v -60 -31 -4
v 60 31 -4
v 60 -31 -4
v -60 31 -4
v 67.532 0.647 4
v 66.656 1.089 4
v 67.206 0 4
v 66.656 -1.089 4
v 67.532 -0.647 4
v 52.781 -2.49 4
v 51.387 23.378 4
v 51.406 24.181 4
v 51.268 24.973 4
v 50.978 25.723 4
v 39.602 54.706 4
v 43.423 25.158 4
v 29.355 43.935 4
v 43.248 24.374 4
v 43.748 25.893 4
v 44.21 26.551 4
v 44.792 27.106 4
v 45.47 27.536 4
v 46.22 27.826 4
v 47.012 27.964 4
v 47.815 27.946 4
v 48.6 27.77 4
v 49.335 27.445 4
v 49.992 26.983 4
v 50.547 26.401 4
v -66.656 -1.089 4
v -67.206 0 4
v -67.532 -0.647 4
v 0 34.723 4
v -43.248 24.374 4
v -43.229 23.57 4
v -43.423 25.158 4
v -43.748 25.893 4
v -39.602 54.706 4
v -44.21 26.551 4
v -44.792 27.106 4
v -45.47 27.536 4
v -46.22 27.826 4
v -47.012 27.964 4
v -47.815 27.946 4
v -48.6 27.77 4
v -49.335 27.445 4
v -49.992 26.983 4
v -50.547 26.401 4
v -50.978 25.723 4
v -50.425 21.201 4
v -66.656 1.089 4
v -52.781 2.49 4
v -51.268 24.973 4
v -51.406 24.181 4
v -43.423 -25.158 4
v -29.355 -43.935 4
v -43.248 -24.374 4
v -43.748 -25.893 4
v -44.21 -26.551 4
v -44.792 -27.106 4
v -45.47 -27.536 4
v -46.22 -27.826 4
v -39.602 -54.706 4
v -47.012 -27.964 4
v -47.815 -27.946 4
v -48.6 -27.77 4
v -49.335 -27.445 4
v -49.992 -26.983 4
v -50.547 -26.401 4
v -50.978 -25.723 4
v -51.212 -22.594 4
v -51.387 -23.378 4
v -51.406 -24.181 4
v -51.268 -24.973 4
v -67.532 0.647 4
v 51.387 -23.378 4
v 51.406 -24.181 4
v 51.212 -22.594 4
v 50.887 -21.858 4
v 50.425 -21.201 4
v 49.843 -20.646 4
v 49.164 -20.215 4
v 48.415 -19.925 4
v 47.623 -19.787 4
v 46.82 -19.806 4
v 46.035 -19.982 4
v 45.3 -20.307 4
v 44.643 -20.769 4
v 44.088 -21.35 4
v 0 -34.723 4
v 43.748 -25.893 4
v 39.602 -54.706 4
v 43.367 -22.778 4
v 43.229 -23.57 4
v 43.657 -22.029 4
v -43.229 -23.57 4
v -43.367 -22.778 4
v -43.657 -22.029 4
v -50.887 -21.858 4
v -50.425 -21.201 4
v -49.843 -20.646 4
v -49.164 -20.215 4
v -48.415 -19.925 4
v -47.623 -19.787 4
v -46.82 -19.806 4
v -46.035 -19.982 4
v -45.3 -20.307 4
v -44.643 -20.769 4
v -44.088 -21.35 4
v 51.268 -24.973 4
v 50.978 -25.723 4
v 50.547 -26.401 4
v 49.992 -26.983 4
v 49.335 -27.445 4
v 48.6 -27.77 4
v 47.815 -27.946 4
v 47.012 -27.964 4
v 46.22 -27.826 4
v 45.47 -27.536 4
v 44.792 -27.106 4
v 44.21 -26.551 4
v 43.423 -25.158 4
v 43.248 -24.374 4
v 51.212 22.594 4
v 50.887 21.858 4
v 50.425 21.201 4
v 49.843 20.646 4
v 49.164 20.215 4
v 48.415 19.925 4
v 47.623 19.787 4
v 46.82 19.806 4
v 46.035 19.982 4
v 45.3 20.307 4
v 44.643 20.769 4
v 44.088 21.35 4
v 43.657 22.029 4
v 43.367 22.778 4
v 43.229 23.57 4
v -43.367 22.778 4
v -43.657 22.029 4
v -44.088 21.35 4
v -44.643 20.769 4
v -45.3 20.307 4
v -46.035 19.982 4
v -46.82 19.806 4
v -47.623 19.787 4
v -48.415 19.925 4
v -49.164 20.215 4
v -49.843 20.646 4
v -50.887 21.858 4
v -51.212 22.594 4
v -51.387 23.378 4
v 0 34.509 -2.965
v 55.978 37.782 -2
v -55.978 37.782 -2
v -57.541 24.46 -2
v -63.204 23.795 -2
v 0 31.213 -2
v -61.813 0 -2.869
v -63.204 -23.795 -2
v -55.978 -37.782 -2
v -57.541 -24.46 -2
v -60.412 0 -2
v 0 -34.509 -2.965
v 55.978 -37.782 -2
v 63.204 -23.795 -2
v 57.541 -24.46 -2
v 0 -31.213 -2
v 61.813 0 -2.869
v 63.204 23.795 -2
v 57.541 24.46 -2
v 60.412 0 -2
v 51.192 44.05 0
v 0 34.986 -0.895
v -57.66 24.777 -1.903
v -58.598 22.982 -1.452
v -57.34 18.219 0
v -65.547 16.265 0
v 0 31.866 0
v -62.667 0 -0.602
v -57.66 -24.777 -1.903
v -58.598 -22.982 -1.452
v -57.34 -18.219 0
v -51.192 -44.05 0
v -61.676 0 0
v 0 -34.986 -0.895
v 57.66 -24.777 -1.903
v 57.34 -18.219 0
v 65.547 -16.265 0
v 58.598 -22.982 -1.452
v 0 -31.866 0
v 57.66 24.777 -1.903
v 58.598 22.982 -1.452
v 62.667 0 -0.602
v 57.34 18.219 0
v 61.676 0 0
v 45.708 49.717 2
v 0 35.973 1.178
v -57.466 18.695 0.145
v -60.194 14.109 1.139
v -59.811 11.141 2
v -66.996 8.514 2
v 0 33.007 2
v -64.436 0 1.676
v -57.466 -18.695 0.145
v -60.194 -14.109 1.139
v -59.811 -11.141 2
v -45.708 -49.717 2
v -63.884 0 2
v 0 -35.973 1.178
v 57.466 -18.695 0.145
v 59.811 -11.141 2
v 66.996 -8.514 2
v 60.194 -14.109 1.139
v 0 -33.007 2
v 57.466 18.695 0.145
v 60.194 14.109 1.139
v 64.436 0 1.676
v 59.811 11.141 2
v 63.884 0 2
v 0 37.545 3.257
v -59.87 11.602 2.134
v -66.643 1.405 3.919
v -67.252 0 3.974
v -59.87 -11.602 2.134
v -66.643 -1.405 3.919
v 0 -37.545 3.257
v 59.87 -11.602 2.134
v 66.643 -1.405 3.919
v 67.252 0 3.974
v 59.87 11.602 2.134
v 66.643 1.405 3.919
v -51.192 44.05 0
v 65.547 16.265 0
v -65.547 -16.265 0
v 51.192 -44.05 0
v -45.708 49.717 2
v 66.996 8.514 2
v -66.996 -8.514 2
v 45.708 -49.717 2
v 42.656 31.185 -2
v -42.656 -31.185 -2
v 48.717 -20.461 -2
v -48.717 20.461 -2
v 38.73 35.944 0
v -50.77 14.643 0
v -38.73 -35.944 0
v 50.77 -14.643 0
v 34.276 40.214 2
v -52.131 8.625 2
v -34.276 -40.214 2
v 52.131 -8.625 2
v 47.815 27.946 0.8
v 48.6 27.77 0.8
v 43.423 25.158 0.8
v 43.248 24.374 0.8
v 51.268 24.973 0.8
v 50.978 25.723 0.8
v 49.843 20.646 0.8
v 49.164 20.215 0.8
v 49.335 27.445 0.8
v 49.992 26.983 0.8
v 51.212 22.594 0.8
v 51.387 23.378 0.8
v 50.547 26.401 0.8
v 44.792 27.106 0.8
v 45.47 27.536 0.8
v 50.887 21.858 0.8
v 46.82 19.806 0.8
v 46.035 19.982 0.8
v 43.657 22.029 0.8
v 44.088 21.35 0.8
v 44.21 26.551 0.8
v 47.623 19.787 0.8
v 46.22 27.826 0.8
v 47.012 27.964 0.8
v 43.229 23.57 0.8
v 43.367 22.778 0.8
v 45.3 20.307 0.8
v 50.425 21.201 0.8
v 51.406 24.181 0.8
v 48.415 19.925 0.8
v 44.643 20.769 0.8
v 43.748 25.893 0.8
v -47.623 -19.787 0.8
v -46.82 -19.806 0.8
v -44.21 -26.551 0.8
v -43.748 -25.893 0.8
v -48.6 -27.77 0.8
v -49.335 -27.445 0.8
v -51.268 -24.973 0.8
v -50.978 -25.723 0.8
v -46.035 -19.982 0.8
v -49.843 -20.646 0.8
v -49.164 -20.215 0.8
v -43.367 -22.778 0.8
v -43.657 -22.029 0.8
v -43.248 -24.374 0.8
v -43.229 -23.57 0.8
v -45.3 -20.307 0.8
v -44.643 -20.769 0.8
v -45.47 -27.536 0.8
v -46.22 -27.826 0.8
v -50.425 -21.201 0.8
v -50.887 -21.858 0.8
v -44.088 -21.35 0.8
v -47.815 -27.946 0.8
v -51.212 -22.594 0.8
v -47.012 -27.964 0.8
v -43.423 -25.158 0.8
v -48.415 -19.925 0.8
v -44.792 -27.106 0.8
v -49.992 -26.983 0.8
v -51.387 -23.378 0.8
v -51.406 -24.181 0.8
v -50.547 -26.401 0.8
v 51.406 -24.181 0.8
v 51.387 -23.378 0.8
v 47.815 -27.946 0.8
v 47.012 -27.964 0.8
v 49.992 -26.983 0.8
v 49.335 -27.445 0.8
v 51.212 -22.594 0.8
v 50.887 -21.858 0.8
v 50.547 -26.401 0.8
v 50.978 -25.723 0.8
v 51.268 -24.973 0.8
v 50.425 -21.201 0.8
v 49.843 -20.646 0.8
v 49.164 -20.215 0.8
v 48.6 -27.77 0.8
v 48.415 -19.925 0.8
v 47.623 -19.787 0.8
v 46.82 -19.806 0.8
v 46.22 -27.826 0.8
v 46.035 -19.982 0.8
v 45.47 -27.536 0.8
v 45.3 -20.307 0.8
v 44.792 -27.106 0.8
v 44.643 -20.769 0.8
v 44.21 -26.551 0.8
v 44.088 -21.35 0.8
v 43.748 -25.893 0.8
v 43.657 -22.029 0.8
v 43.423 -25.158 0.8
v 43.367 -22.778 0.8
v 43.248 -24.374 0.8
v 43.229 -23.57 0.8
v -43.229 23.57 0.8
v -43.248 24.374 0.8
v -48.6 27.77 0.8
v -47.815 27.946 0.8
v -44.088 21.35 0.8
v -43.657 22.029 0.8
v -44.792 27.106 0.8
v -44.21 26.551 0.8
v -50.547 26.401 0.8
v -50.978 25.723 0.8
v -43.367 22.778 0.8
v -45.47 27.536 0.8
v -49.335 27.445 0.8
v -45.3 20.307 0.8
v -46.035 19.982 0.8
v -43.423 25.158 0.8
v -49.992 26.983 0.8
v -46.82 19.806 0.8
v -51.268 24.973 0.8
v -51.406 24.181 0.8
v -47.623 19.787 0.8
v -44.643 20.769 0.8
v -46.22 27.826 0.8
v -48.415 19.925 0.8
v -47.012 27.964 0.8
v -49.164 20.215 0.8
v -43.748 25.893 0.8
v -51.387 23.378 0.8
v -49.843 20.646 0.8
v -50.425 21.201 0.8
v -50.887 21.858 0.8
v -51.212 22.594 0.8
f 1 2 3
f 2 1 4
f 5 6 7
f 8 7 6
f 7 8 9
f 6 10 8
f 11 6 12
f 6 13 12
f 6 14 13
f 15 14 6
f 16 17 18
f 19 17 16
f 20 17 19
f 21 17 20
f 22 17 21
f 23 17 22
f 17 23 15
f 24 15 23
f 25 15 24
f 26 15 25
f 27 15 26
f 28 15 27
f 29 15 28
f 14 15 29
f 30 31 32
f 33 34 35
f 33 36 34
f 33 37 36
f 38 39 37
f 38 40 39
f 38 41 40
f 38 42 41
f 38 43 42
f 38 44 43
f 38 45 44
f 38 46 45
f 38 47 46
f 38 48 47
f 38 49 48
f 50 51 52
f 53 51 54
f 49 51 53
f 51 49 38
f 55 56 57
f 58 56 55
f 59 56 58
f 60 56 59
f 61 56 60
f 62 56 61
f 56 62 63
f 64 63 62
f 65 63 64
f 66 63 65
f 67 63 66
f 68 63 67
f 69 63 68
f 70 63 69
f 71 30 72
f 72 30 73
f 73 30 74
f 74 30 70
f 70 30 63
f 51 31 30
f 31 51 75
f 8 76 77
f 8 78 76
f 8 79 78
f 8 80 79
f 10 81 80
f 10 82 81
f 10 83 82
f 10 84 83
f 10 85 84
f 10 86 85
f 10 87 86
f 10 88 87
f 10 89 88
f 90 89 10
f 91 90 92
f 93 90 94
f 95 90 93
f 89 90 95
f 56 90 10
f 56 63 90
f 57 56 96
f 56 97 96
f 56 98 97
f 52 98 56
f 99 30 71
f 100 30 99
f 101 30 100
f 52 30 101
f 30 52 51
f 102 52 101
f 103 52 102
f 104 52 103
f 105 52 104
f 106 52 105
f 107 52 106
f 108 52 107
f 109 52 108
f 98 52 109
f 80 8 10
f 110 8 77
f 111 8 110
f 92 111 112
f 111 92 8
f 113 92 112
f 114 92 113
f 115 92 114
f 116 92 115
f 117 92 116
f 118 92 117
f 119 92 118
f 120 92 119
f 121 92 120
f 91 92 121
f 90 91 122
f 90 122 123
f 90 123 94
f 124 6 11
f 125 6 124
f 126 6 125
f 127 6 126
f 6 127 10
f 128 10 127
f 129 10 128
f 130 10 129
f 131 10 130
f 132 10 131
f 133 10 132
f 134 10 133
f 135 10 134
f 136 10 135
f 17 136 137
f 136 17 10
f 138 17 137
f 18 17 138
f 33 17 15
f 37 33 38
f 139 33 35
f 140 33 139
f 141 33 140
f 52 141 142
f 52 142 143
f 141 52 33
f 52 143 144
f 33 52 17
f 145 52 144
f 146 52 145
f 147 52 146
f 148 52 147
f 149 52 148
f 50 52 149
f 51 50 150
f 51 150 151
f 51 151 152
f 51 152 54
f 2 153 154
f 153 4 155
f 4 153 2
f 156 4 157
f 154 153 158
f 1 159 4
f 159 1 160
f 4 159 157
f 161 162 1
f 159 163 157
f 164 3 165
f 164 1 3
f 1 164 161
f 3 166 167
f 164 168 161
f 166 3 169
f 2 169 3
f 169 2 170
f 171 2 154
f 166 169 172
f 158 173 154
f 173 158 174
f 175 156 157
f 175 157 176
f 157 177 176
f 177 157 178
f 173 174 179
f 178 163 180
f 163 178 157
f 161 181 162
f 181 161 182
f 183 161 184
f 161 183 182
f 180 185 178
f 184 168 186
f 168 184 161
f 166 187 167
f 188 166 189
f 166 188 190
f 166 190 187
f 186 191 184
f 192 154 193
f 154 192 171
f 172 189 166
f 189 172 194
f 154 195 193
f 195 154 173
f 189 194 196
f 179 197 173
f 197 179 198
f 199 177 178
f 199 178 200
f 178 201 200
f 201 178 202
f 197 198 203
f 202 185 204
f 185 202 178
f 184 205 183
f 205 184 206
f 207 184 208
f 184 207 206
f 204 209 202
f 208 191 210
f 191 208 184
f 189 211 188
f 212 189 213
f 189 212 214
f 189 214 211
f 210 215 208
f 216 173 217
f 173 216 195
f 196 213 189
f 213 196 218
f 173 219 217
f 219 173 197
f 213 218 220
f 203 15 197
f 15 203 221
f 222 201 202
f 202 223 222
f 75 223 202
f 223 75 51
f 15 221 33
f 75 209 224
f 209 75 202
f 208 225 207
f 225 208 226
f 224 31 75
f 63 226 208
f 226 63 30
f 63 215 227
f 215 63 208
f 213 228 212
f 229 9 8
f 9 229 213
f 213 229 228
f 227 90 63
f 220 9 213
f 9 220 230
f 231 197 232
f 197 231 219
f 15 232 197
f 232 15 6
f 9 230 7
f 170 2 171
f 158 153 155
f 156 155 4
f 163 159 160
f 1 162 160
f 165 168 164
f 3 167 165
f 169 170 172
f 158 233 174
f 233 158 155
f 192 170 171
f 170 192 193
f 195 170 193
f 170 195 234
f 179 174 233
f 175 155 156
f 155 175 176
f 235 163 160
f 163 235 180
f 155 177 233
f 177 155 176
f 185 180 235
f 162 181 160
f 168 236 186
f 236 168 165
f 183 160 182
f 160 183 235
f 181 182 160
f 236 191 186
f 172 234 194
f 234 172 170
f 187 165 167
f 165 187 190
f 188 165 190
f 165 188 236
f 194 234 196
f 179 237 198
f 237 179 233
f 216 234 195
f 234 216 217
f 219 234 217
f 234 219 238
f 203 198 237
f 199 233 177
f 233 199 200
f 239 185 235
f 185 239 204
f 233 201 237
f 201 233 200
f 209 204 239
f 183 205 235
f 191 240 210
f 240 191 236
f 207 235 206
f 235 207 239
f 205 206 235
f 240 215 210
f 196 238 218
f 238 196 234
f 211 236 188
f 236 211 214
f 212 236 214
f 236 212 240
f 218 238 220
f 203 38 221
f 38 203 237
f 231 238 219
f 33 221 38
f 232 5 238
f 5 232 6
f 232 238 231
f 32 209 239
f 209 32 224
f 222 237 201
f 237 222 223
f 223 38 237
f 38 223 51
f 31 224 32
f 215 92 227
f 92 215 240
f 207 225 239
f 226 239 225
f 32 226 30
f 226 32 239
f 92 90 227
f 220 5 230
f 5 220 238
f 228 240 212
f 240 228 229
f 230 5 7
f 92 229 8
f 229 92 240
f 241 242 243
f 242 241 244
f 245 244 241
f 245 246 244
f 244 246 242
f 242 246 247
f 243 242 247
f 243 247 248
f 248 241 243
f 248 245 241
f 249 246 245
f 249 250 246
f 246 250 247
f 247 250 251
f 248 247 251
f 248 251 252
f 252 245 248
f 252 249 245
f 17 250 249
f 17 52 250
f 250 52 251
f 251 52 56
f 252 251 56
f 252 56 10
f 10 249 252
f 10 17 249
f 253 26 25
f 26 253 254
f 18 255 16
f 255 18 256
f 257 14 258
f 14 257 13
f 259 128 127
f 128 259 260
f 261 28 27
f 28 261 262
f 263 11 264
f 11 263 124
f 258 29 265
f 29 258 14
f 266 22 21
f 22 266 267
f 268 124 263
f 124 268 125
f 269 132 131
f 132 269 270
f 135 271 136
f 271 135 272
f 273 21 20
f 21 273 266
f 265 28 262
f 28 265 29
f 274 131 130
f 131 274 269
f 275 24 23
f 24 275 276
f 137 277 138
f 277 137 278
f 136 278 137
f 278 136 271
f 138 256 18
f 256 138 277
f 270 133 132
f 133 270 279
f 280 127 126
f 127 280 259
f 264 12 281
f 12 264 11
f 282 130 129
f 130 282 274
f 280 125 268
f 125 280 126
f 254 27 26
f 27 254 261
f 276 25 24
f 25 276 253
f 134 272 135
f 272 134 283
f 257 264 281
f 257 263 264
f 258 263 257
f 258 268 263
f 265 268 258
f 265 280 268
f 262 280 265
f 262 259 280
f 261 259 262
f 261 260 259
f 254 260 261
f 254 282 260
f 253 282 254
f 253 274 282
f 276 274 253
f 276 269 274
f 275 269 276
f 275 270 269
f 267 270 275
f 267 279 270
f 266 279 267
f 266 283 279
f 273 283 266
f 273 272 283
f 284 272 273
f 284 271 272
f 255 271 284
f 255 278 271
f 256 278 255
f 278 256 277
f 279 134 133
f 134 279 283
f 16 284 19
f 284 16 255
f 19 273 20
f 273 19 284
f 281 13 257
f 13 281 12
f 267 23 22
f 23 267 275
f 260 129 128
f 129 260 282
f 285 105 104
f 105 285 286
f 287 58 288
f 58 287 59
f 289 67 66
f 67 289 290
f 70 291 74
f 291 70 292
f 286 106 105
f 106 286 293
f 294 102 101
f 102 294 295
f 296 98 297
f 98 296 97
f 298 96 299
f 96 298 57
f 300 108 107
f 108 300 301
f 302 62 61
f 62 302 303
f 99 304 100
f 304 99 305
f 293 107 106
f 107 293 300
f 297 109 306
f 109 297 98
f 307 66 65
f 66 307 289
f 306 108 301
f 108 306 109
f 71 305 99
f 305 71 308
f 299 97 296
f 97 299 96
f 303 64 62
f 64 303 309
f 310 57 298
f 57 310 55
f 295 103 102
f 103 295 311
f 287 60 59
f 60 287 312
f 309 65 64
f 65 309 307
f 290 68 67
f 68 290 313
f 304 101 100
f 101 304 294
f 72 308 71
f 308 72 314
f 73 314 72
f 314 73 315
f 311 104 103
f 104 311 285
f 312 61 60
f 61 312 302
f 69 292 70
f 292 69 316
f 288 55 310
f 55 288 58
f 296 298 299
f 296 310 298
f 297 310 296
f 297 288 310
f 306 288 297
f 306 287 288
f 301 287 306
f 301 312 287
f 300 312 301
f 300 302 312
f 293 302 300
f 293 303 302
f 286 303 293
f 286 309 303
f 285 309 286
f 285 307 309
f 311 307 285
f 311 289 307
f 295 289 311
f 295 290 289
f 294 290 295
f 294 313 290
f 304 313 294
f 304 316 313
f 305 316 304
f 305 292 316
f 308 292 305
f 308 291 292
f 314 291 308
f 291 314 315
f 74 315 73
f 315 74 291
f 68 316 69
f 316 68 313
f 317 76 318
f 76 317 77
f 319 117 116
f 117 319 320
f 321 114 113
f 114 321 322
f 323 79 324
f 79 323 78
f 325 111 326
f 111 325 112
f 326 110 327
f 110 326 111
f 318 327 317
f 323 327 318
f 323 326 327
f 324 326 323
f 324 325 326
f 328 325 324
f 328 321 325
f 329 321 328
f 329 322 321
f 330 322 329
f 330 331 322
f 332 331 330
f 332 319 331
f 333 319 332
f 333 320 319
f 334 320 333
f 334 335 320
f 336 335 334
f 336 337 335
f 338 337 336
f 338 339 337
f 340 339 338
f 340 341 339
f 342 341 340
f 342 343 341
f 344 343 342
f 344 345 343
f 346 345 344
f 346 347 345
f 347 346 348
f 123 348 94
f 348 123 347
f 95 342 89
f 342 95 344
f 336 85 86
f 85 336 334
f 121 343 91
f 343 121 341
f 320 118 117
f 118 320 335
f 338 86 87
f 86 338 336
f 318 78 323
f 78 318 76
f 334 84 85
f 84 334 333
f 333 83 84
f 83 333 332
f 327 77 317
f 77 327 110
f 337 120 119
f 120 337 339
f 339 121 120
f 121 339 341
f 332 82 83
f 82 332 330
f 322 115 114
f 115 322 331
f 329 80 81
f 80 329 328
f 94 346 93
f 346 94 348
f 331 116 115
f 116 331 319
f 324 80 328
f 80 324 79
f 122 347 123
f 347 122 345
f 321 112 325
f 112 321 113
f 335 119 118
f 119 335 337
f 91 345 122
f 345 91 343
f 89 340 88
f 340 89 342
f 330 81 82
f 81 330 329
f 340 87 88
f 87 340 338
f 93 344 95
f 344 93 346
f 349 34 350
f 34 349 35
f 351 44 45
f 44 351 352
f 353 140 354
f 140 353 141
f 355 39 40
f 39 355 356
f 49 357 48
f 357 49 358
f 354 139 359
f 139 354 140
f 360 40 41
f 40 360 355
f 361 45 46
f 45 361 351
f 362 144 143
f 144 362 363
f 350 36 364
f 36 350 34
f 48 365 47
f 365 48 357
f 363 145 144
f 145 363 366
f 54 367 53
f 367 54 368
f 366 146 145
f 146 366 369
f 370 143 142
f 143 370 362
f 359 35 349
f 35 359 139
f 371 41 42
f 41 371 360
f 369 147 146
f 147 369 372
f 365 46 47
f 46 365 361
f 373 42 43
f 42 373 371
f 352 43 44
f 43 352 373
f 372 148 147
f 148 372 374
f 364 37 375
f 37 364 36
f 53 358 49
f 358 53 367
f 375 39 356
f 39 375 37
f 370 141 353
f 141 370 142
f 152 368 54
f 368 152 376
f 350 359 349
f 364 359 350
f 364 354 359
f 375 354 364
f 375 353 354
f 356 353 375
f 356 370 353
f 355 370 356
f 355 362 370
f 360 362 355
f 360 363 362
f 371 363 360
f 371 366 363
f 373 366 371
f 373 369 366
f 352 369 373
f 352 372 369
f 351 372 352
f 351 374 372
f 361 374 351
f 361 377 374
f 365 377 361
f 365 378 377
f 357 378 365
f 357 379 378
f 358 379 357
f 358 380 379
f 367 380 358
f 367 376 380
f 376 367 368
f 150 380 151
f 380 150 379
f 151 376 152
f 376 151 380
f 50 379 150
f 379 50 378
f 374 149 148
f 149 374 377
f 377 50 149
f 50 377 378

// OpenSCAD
//cube([40,40,2]);

Gab_Mag = 14; //Gab Magnet, Espacio para el iman
X_Poly = 92/2;
Y_Poly = 52/2;
H = 8 ; // Altura del objeto

D_Mag = 8.2 ; // Diametro del iman
H_Mag = 3.2 ; // Altura del iman 

E= 5; // Espesor
Vec_Poly_Ext = [[X_Poly+Gab_Mag,Y_Poly+E],[-(X_Poly+Gab_Mag),Y_Poly+E],[-(X_Poly+Gab_Mag),-(Y_Poly+E)],[X_Poly+Gab_Mag,-(Y_Poly+E)]];
Vec_Poly_Int = [[X_Poly,Y_Poly],[-X_Poly,Y_Poly],[-X_Poly,-Y_Poly],[X_Poly,-Y_Poly]];

//Vec_Poly_Ext = [[X_Poly+E,Y_Poly+E],[-(X_Poly+E),Y_Poly+E],[-(X_Poly+E),-(Y_Poly+E)],[X_Poly+E,-(Y_Poly+E)]];
//Vec_Poly_Int = [[X_Poly,Y_Poly],[-X_Poly,Y_Poly],[-X_Poly,-Y_Poly],[X_Poly,-Y_Poly]];



Twist_Obj = 3.15*8.5; 
Slices_Obj = 4;
Rot_Slice = Twist_Obj / Slices_Obj;
H_Slice = H/Slices_Obj;
echo ("Altura Capa es: ",H_Slice," mm");
echo ("Rotacion por Capa es: ",Rot_Slice,"°");

*polygon(points=Vec_Poly_Ext);
*color("red")
*polygon(points=Vec_Poly_Int);

difference()
{
    union()
    {
        linear_extrude(height = H, center = true, convexity = 0, twist = -Twist_Obj, slices = Slices_Obj)
        //translate([2, 0, 0])
        //circle(r=10);
        polygon(points=Vec_Poly_Ext);

       // color("red")
        linear_extrude(height = H, center = true, convexity = 0, twist = Twist_Obj, slices = Slices_Obj)
        //translate([2, 0, 0])
        //circle(r=10);
        polygon(points=Vec_Poly_Ext);
    }



    rotate([0,0,Rot_Slice])
    translate([0,0,H_Slice])
    union()
    {
        linear_extrude(height = H, center = true, convexity = 0, twist = -Twist_Obj, slices = Slices_Obj)
        //translate([2, 0, 0])
        //circle(r=10);
        polygon(points=Vec_Poly_Int);

      * color("red")
        linear_extrude(height = H, center = true, convexity = 0, twist = Twist_Obj, slices = Slices_Obj)
        //translate([2, 0, 0])
        //circle(r=10);
        polygon(points=Vec_Poly_Int);
    }
    //color("red")
    rotate([0,0,Twist_Obj])
        translate([X_Poly+Gab_Mag/2,0,H/2-H_Mag])
            cylinder(d=D_Mag, h=H_Mag, ceneter=true, $fn=32);
    //color("red")
    rotate([0,0,Twist_Obj])
        translate([-(X_Poly+Gab_Mag/2),0,H/2-H_Mag])
            cylinder(d=D_Mag, h=H_Mag, ceneter=true, $fn=32);
        //color("red")
    rotate([0,0,-Twist_Obj])
        translate([X_Poly+Gab_Mag/2,0,H/2-H_Mag])
            cylinder(d=D_Mag, h=H_Mag, ceneter=true, $fn=32);
    //color("red")
    rotate([0,0,-Twist_Obj])
        translate([-(X_Poly+Gab_Mag/2),0,H/2-H_Mag])
            cylinder(d=D_Mag, h=H_Mag, ceneter=true, $fn=32);
}



/*
 linear_extrude(height=10, scale=[1,0.1], slices=20, twist=0)
 polygon(points=[[0,0],[20,10],[20,-10]]);
 */
